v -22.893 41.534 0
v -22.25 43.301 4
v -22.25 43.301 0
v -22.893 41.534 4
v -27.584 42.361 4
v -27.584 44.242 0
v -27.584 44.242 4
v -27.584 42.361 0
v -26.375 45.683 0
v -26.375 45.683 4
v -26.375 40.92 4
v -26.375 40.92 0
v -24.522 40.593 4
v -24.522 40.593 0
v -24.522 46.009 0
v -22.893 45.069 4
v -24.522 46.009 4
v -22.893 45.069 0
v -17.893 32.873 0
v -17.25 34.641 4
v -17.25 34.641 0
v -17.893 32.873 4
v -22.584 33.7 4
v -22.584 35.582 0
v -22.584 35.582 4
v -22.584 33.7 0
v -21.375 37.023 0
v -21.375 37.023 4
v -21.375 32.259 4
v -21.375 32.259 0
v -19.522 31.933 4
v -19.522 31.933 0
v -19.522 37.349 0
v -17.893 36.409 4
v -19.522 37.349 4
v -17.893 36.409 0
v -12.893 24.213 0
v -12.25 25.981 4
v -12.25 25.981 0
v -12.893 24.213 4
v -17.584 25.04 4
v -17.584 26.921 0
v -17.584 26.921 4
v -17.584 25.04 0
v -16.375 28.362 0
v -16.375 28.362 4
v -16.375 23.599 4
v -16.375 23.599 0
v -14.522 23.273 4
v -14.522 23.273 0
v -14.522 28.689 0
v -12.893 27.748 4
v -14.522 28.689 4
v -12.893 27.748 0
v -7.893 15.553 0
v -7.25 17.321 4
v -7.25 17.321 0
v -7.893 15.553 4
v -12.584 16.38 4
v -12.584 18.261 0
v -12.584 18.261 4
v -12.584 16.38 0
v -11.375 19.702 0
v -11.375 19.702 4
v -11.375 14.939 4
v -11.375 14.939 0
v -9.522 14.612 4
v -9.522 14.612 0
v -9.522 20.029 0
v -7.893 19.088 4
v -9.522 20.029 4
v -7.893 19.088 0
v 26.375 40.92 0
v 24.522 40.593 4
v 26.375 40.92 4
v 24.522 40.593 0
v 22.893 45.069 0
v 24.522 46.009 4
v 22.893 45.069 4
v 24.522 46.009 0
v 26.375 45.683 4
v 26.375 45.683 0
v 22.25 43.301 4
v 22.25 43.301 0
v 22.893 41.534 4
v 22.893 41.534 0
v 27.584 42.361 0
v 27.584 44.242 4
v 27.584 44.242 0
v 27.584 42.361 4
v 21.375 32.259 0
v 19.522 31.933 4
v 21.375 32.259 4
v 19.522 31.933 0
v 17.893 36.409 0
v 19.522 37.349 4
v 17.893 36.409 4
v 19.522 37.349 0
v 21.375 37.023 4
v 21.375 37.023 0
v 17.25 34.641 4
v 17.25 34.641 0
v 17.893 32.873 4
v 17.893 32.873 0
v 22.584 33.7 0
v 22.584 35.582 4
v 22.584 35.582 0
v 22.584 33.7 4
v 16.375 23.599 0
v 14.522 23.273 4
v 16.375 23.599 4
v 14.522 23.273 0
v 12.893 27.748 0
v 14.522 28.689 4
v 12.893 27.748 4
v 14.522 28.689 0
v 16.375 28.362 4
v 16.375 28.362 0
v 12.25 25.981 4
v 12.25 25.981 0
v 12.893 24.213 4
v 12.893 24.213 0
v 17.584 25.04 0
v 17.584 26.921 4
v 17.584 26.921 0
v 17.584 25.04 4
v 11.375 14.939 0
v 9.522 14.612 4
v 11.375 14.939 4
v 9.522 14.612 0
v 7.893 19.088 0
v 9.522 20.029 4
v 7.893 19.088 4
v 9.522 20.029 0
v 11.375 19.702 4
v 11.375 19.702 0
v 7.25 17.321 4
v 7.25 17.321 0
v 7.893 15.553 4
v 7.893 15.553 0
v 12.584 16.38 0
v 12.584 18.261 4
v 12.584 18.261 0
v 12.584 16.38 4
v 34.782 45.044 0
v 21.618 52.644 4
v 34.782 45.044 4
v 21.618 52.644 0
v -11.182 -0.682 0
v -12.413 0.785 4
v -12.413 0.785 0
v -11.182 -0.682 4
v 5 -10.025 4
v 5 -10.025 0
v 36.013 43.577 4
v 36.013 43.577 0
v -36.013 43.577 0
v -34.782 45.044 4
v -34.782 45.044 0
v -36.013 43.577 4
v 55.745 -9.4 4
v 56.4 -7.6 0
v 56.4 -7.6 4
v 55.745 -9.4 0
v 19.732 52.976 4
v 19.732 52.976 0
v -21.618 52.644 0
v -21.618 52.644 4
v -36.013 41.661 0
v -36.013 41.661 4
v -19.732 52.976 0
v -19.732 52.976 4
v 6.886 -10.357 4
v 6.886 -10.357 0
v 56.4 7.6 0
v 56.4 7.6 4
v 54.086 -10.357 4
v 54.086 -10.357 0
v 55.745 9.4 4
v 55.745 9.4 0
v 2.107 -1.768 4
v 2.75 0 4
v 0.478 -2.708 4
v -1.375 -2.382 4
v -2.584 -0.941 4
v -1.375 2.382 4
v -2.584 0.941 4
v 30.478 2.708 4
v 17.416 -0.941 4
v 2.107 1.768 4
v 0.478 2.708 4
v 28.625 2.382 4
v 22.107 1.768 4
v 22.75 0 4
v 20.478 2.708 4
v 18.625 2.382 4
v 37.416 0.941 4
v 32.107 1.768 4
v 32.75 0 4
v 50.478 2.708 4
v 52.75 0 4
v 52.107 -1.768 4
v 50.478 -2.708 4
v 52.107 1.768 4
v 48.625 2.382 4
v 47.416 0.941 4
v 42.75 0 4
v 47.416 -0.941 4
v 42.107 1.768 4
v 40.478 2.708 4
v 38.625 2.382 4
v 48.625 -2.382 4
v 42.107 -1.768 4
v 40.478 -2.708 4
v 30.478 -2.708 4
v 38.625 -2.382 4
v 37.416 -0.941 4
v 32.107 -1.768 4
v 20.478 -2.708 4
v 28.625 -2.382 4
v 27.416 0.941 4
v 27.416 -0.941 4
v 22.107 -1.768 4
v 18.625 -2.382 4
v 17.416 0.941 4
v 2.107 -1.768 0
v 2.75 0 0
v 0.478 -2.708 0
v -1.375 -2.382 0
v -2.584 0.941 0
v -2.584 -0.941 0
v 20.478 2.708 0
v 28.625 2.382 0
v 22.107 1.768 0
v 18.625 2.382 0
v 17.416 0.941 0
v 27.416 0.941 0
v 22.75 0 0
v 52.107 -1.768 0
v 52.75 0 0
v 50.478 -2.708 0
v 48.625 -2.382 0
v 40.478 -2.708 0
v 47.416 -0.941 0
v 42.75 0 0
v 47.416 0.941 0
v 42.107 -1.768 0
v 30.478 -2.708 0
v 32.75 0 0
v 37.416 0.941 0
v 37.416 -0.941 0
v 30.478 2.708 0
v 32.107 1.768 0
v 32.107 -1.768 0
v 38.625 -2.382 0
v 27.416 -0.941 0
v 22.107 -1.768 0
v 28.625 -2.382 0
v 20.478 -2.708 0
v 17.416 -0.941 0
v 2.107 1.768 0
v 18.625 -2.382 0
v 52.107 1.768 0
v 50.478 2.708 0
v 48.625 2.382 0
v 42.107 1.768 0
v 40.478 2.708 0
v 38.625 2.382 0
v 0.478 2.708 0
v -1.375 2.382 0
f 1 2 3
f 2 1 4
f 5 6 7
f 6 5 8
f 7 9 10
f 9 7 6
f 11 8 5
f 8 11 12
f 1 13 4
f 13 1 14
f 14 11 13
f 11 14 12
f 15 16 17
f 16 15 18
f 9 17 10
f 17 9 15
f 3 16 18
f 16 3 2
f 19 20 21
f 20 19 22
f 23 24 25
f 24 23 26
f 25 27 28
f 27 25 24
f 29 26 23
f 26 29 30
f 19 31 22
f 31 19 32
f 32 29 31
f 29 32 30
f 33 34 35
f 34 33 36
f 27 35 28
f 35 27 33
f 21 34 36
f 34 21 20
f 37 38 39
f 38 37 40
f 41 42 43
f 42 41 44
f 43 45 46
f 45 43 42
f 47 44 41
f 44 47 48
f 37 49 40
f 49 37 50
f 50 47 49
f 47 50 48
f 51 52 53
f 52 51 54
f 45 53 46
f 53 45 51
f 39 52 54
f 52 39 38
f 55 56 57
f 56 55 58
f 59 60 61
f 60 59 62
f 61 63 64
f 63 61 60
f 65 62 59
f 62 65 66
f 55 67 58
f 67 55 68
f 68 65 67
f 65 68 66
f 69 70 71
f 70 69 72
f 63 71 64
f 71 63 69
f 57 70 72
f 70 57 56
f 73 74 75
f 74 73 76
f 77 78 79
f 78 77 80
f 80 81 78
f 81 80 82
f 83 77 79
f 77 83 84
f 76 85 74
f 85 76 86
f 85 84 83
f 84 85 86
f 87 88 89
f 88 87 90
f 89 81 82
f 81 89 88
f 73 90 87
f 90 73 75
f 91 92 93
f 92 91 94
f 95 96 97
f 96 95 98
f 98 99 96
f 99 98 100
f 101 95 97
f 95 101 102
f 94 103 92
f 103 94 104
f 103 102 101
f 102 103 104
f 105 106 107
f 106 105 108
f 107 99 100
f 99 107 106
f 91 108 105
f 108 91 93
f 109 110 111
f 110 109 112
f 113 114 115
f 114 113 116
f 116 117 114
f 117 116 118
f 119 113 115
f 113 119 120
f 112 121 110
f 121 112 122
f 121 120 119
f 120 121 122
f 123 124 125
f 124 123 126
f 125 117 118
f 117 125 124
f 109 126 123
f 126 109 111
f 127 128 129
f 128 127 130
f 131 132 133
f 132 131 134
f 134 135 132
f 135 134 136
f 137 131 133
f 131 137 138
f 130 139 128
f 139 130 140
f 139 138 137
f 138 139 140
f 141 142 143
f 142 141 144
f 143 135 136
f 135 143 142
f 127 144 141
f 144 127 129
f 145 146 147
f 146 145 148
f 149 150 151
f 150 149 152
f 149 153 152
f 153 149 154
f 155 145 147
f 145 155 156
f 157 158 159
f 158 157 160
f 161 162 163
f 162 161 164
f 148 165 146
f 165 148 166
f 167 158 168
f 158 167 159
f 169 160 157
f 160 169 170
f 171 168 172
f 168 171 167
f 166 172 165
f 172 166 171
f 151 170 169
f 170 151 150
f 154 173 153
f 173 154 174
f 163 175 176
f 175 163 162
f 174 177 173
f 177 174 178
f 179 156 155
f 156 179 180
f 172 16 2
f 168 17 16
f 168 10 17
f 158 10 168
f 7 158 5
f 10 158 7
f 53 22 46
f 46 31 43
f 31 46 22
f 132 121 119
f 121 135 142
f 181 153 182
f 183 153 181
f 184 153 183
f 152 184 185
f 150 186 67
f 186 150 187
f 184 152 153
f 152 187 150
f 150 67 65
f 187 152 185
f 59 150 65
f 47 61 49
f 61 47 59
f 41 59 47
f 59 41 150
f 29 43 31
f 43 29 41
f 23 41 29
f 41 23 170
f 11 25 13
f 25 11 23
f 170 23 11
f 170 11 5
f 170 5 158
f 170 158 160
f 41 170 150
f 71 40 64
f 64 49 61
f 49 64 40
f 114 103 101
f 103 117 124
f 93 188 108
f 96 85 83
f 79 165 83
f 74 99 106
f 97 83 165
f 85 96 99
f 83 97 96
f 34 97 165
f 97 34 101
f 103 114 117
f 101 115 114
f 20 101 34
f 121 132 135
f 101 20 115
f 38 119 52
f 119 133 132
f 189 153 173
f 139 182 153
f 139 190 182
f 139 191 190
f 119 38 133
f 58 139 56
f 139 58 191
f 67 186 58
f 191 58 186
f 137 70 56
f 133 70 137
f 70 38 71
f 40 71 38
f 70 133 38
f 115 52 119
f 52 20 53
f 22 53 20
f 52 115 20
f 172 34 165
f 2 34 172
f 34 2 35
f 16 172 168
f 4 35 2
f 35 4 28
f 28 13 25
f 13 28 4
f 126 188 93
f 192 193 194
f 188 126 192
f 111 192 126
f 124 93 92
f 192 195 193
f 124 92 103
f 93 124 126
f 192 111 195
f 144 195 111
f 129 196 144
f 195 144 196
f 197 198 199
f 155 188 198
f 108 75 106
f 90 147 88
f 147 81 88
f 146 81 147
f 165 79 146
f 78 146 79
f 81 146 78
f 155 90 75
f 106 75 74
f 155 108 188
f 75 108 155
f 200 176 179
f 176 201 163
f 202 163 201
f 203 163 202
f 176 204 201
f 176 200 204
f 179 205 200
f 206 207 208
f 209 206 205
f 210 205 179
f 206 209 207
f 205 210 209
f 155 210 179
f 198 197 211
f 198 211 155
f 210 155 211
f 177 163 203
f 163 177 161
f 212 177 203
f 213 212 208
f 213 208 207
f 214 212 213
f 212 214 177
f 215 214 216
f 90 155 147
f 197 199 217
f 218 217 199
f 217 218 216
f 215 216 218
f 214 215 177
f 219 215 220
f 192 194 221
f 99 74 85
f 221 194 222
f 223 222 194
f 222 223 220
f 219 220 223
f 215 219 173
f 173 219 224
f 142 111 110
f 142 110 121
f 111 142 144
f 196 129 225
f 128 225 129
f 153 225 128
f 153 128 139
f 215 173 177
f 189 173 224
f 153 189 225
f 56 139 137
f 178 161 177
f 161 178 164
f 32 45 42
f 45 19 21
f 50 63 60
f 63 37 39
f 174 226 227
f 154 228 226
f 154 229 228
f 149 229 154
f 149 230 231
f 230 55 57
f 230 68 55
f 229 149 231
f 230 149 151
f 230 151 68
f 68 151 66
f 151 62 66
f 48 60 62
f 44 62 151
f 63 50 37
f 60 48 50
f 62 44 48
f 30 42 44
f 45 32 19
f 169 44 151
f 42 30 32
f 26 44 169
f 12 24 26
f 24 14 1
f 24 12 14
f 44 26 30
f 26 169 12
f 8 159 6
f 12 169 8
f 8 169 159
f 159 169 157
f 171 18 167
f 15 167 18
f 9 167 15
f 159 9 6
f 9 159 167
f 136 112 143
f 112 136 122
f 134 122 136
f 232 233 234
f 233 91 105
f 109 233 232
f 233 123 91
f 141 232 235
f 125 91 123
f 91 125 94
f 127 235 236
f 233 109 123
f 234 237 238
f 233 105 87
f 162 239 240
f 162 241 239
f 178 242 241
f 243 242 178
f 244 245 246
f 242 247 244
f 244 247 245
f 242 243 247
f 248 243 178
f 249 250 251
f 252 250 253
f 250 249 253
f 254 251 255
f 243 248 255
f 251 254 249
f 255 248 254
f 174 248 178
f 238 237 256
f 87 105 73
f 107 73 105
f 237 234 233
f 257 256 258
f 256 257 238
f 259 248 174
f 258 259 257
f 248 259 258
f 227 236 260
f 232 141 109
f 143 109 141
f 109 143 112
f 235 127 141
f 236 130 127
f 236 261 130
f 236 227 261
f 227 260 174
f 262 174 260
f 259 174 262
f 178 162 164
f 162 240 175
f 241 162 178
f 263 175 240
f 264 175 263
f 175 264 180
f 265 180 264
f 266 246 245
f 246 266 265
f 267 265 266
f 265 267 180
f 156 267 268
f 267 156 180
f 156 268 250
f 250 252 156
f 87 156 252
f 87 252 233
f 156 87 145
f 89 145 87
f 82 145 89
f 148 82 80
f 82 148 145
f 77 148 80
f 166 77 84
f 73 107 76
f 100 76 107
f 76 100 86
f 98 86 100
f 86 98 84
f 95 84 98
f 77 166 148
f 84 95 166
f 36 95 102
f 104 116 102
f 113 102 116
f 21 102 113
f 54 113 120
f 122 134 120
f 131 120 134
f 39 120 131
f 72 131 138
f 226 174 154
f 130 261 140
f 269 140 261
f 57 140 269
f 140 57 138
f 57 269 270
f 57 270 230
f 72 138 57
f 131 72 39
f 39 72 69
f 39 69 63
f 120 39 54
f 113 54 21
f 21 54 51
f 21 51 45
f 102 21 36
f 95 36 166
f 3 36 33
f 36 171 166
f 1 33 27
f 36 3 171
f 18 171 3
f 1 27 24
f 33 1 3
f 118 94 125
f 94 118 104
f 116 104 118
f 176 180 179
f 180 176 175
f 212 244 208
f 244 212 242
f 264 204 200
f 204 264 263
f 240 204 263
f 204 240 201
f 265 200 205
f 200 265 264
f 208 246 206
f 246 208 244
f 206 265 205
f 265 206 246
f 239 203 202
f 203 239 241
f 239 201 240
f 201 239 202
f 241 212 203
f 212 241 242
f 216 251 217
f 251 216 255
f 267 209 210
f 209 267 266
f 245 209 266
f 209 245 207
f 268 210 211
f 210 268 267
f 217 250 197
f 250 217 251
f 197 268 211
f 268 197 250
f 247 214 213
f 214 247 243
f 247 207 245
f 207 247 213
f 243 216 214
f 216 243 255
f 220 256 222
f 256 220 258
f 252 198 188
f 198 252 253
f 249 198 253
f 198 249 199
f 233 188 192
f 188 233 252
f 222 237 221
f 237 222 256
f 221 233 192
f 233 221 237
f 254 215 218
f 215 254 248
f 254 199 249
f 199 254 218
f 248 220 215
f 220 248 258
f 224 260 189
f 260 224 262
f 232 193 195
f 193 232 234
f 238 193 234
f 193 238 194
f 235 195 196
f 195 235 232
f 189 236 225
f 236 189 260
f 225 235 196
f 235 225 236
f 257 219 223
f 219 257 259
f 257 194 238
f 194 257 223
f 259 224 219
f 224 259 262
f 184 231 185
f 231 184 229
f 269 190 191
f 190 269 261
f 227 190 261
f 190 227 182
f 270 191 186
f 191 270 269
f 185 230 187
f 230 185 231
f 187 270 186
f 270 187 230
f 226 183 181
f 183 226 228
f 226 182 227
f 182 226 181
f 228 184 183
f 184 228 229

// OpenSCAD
// rob@openpart.co.uk 20140204-03:34
// 13 hole joining plate to connect 3 off 20mm NOMINAL extrusion at 120 degrees
// V-Slot & others

module roundedRect(size, radius) {
	x = size[0];
	y = size[1];
	z = size[2];
	linear_extrude(height=z)
	hull()
	{
		// place 4 circles in the corners, with the given radius
		translate([(-x/2)+(radius/2), (-y/2)+(radius/2), 0])
		circle(r=radius);
		translate([(x/2)-(radius/2), (-y/2)+(radius/2), 0])
		circle(r=radius);
		translate([(-x/2)+(radius/2), (y/2)-(radius/2), 0])
		circle(r=radius);
		translate([(x/2)-(radius/2), (y/2)-(radius/2), 0])
		circle(r=radius);
	}
}
angle = 120;
hole = 5.5 / 2;
plate_width1 = 18;
plate_width2 = 18;
plate_width3 = 18;
plate_length1 = 50;
plate_length2 = 50;
plate_length3 = 50;
plate_thickness = 4;
extend_past_thickness = 2;
corner_radius = 2.8;

difference() {
hull () {
		rotate([0,0,(angle/2)]) {
			translate([30, 0, 0])
				roundedRect ([plate_length1, plate_width1, plate_thickness], corner_radius);
		}
		rotate([0,0,angle]) {
			translate([30, 0, 0])
				roundedRect ([plate_length3, plate_width1, plate_thickness], corner_radius);
		}

		translate([30, 0, 0])
				roundedRect ([plate_length2, plate_width2, plate_thickness], corner_radius);
	}

		rotate([0,0,angle]) {
			translate([50,00,-1])
					cylinder(h = (extend_past_thickness+plate_thickness), r = hole);
			translate([40,0,-1])
					cylinder(h = (extend_past_thickness+plate_thickness), r = hole);
			translate([30,0,-1])
					cylinder(h = (extend_past_thickness+plate_thickness), r = hole);
			translate([20,0,-1])
					cylinder(h = (extend_past_thickness+plate_thickness), r = hole);
		}

			translate([50,00,-1])
					cylinder(h = (extend_past_thickness+plate_thickness), r = hole);
			translate([40,0,-1])
					cylinder(h = (extend_past_thickness+plate_thickness), r = hole);
			translate([30,0,-1])
					cylinder(h = (extend_past_thickness+plate_thickness), r = hole);
			translate([20,0,-1])
					cylinder(h = (extend_past_thickness+plate_thickness), r = hole);

		rotate([0,0,(angle/2)]) {
			translate([50,0,-1])
					cylinder(h = (extend_past_thickness+plate_thickness), r = hole);
			translate([40,00,-1])
					cylinder(h = (extend_past_thickness+plate_thickness), r = hole);
			translate([30,0,-1])
					cylinder(h = (extend_past_thickness+plate_thickness), r = hole);
			translate([20,0,-1])
					cylinder(h = (extend_past_thickness+plate_thickness), r = hole);

		}

			translate([0,0,-1])
					cylinder(h = (extend_past_thickness+plate_thickness), r = hole);
}
